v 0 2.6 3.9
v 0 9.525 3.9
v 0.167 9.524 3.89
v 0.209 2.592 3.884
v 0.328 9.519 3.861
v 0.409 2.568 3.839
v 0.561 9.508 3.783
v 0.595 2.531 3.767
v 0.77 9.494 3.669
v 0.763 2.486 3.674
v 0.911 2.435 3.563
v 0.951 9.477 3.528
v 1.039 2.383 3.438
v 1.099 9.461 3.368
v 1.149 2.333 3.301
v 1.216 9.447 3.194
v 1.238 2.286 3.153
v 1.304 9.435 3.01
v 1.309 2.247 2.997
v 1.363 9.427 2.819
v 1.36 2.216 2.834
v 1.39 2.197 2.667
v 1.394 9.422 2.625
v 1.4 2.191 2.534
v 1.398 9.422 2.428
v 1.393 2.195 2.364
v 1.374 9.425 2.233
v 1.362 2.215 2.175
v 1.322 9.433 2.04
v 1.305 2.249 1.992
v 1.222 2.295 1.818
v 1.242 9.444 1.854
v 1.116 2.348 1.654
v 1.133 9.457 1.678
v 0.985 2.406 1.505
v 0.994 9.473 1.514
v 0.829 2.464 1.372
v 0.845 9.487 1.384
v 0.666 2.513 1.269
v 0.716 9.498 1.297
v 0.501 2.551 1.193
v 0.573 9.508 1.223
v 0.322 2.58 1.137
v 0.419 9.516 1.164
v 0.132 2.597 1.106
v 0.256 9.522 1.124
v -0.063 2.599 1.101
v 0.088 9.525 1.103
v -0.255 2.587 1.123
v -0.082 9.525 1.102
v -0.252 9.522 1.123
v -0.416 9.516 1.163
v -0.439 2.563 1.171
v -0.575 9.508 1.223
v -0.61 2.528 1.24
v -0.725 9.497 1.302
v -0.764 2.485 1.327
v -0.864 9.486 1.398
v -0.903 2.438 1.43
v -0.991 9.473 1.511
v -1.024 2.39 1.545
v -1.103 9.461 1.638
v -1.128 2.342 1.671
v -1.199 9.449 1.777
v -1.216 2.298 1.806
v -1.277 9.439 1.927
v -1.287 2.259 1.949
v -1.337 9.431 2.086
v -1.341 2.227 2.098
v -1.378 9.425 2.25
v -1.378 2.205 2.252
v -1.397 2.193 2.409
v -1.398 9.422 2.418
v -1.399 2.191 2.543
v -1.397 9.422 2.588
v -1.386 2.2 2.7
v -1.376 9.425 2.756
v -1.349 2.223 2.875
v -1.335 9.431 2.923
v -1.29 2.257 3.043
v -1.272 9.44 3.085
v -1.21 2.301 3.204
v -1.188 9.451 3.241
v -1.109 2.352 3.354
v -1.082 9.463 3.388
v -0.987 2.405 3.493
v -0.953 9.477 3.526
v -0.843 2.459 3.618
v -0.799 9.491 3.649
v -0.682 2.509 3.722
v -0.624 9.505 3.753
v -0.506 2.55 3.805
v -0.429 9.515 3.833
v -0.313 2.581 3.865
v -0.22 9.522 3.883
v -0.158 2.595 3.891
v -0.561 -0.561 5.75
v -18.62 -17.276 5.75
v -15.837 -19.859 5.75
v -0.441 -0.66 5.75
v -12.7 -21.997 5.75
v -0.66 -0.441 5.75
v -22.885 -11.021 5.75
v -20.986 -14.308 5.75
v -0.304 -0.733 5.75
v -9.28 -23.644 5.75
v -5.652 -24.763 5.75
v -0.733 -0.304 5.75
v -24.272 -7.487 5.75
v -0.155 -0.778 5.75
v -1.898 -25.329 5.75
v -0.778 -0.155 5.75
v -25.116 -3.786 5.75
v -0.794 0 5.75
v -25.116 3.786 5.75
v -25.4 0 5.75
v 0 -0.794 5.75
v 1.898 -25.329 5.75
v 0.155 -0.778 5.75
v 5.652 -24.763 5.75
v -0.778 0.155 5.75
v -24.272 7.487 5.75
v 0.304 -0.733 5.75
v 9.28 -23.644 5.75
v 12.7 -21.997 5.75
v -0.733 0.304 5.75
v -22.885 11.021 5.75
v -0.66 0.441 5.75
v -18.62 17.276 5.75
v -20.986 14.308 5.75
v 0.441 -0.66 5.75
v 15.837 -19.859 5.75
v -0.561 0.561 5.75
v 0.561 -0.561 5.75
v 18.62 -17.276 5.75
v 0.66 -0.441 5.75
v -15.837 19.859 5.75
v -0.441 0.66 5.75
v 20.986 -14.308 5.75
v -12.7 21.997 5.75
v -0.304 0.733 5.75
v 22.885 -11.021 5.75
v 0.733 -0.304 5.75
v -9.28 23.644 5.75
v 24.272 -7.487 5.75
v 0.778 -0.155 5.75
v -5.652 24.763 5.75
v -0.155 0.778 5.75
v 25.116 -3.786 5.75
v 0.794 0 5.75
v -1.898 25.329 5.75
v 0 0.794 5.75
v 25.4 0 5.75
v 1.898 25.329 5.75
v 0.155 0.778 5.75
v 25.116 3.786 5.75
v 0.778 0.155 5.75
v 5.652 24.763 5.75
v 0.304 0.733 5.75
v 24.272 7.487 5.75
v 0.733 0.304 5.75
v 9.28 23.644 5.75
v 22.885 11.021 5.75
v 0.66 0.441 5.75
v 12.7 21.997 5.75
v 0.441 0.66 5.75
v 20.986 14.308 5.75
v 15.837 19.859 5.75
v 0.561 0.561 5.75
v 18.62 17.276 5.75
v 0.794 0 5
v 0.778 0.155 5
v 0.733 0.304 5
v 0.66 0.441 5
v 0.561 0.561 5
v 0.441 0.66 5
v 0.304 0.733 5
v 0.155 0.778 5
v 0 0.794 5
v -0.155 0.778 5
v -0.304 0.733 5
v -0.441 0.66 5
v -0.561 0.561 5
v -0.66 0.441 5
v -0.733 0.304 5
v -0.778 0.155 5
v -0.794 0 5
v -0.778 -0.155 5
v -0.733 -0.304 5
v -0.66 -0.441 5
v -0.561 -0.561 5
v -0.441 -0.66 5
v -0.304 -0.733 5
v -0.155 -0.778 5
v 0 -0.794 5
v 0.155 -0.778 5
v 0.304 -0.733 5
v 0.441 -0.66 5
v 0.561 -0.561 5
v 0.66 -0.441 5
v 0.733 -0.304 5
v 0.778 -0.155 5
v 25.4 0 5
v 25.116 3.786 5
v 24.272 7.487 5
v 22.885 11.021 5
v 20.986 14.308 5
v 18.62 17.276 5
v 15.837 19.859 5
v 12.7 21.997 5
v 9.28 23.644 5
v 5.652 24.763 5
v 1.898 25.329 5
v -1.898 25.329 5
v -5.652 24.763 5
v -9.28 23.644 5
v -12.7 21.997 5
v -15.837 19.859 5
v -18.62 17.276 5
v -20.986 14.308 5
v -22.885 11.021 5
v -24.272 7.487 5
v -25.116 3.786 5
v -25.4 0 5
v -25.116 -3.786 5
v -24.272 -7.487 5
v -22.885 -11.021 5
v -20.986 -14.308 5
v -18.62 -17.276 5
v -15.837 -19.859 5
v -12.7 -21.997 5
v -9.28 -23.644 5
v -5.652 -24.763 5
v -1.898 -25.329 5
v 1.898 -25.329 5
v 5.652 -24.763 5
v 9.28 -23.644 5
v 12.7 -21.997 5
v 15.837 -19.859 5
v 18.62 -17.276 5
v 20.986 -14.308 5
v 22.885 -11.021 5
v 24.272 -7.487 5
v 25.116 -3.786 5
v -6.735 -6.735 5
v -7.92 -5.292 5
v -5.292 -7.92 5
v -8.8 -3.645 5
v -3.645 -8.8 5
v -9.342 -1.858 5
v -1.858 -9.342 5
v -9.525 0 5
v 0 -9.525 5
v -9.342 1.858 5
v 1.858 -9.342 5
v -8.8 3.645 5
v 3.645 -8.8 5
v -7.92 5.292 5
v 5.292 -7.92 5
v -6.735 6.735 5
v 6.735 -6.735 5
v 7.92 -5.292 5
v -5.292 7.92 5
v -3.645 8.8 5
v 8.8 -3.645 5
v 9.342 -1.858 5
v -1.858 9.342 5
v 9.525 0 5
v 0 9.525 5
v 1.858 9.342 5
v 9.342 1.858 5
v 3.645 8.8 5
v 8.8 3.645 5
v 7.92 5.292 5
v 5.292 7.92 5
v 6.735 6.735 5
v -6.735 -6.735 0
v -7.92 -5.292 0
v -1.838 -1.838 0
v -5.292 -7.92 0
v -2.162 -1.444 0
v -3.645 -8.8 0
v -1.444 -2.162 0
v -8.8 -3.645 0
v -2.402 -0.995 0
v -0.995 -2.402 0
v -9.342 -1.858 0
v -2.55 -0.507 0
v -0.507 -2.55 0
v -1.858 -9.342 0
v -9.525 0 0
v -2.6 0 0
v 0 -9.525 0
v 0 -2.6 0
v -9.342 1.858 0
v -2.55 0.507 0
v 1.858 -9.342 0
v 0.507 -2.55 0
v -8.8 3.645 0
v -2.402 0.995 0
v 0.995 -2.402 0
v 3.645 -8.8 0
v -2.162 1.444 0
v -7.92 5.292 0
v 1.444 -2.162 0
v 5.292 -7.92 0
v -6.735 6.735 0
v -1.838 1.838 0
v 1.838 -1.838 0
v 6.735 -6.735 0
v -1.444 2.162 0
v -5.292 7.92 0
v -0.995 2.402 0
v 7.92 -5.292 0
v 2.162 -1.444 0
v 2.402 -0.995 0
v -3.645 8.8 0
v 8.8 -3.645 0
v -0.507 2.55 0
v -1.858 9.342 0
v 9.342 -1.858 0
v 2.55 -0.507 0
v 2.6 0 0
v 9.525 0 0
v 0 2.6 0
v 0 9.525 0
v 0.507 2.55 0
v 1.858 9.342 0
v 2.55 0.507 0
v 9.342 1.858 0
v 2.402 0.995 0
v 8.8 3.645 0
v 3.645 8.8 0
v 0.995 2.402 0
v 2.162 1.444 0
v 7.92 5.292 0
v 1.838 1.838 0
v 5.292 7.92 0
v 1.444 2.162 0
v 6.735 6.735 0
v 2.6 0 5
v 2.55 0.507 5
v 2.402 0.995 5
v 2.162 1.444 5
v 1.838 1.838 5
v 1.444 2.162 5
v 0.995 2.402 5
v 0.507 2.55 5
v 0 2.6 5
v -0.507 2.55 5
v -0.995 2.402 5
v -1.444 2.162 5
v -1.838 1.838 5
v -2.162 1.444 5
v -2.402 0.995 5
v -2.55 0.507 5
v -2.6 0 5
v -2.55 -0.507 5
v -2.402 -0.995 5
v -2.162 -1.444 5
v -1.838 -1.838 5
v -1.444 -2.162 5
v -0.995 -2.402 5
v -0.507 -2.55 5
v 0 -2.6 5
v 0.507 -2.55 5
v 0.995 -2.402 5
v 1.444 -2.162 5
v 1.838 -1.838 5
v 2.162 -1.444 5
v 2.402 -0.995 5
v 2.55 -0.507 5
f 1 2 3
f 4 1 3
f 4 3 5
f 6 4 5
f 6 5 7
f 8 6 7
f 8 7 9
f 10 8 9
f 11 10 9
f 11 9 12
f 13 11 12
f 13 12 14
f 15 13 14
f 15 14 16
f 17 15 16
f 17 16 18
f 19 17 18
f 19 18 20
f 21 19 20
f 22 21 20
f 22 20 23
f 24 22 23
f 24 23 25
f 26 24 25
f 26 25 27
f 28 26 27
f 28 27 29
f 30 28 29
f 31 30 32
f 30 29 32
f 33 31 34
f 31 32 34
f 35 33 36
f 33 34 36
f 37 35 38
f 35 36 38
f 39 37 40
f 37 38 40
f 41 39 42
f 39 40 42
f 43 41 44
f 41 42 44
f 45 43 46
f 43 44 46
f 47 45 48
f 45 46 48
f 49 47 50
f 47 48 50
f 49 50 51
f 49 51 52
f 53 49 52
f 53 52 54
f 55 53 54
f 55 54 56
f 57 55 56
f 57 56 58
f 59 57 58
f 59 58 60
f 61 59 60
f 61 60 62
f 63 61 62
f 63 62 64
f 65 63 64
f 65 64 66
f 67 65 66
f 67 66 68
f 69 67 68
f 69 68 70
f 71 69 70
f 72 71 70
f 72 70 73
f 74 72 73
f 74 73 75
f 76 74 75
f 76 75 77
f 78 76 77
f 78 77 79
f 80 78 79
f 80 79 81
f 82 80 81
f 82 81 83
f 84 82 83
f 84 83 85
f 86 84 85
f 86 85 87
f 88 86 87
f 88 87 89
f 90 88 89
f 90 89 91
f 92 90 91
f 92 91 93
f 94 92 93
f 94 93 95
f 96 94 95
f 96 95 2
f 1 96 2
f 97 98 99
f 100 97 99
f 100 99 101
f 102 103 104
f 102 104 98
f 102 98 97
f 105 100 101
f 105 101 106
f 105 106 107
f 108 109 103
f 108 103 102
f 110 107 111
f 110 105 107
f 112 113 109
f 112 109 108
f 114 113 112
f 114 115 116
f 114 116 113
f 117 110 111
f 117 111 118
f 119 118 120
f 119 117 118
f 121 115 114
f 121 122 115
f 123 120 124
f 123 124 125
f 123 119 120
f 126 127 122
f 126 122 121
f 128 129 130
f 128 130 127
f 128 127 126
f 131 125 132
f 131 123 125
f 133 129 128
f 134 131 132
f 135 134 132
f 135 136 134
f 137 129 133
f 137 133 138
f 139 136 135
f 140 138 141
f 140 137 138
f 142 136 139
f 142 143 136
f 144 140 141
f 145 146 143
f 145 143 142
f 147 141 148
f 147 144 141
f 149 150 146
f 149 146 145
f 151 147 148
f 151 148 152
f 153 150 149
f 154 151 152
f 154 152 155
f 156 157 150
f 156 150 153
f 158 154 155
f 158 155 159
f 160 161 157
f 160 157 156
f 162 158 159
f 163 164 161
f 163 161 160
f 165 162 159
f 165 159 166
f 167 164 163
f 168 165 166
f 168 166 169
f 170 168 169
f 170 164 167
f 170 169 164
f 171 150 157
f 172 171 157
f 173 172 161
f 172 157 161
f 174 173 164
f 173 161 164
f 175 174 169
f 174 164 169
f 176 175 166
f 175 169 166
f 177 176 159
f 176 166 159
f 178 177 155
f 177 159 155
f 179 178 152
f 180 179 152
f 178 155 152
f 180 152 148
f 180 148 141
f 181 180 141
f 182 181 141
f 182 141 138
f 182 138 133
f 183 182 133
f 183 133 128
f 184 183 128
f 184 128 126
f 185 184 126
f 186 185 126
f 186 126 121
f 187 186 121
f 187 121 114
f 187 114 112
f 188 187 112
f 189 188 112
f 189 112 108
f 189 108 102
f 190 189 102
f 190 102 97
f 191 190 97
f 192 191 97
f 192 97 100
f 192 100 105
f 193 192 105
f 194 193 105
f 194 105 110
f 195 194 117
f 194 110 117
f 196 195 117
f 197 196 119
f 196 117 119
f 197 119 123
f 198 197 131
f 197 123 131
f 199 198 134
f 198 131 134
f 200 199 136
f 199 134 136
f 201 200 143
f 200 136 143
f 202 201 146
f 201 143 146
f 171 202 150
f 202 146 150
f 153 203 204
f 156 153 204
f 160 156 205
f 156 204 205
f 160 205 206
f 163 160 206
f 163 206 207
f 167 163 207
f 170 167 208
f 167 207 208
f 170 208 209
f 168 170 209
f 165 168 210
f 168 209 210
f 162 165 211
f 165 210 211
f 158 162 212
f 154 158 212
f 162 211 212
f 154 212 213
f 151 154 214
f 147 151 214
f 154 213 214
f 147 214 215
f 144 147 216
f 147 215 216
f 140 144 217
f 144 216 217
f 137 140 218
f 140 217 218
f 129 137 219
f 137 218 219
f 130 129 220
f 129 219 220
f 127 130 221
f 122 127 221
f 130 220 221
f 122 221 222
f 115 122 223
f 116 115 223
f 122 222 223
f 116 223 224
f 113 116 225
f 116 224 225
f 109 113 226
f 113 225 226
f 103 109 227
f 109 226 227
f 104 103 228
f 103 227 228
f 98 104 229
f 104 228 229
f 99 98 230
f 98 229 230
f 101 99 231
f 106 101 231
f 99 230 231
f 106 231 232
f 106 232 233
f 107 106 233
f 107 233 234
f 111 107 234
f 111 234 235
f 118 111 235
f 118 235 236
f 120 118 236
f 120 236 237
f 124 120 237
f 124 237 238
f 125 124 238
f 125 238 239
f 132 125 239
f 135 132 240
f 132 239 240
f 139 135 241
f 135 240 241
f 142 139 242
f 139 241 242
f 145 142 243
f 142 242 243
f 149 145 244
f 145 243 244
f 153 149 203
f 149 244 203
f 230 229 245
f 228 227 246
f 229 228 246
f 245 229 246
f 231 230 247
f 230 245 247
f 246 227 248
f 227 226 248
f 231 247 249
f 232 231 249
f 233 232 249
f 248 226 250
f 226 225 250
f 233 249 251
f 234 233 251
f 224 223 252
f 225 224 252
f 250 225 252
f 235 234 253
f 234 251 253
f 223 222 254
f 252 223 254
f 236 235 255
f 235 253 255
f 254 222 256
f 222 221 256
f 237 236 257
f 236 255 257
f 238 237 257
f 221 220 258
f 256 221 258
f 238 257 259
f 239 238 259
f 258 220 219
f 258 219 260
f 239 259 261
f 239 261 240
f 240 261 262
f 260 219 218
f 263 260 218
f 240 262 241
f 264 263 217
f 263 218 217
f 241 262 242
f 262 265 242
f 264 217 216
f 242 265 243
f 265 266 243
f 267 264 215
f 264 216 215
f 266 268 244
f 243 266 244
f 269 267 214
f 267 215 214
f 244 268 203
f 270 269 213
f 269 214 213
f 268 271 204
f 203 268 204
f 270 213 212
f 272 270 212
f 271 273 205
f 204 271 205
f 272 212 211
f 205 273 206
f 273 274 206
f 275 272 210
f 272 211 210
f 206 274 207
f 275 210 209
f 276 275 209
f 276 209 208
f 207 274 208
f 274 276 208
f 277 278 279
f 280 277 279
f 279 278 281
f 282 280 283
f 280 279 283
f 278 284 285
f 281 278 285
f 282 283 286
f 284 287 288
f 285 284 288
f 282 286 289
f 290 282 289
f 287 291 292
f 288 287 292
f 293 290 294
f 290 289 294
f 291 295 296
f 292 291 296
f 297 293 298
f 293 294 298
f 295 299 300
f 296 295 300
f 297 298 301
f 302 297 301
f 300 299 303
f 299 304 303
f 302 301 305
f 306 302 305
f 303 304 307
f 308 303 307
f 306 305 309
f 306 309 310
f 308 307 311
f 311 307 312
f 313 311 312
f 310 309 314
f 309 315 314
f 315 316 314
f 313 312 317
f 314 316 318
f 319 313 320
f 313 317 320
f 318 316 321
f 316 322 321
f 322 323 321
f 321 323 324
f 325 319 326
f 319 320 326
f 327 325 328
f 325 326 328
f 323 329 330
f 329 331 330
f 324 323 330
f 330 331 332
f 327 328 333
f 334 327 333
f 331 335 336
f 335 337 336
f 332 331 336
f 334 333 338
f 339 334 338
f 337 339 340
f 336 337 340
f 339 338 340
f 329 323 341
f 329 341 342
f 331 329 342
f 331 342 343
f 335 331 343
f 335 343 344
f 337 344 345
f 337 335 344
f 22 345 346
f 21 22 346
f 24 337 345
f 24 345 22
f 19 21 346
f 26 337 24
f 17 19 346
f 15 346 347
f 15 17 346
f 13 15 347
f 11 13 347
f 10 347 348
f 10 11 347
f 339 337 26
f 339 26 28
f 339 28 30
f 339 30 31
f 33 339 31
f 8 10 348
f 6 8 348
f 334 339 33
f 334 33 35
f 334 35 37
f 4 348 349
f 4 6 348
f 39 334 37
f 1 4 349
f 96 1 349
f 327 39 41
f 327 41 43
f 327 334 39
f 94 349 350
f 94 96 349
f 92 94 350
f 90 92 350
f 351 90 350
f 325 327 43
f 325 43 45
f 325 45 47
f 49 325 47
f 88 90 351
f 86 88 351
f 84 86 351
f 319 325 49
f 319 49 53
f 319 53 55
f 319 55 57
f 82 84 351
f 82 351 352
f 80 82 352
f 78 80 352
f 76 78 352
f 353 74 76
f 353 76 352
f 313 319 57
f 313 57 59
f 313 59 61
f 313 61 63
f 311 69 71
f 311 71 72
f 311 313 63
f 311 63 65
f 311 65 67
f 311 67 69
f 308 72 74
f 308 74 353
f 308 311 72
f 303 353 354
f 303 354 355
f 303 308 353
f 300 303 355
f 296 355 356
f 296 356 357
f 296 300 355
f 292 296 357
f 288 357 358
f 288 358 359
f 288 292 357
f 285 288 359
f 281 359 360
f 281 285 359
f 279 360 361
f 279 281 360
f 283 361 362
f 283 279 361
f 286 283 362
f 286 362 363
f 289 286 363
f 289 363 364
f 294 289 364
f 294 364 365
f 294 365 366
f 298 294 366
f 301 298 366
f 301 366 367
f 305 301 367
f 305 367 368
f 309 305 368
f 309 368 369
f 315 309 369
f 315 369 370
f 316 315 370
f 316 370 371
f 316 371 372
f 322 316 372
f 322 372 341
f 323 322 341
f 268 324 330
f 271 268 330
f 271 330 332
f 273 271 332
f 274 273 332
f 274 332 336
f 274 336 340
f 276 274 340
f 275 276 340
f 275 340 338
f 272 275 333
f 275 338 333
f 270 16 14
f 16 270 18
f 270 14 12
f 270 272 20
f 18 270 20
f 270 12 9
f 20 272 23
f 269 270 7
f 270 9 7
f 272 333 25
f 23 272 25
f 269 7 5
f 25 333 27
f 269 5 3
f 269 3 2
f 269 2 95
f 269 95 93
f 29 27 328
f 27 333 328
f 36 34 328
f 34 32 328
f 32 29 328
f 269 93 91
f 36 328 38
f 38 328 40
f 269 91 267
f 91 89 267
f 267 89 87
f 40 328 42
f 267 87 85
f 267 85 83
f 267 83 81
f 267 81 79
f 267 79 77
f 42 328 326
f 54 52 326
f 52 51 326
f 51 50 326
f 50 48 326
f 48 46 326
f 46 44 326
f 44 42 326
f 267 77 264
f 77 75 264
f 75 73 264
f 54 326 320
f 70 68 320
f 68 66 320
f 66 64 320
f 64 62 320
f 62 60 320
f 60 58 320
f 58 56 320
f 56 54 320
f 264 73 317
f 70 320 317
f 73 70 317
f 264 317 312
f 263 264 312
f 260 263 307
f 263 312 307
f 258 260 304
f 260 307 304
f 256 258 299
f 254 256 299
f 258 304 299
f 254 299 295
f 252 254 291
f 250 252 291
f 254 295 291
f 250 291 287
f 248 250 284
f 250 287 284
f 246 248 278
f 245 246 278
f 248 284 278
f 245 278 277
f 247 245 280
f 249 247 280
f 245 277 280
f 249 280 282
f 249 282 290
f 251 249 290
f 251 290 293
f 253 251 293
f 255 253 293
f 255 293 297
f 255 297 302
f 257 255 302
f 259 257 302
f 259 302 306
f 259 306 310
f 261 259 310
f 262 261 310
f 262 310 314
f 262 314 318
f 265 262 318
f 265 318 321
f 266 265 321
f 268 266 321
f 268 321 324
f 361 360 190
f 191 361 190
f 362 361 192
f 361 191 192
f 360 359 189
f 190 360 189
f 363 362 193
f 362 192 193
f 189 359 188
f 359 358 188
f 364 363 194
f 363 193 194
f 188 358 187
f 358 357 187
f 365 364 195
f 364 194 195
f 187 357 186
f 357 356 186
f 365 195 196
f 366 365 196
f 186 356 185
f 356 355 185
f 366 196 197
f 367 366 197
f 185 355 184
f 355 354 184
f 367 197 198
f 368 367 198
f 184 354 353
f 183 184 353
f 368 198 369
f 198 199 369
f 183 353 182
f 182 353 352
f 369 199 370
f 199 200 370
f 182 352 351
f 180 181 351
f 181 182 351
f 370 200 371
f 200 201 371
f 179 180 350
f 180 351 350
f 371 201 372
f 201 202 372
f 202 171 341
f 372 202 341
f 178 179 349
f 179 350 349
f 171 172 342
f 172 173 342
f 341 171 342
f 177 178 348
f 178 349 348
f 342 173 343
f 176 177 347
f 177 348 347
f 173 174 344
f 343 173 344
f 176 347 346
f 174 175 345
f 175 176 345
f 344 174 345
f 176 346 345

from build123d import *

# Parameters (mm, degrees)
SKETCH1_R               = 9.525
SKETCH1_R_2             = 2.599995
BOSS_EXTRUDE1_DEPTH     = 5
SKETCH2_R               = 25.4
BOSS_EXTRUDE2_DEPTH     = 0.75
SKETCH6_R               = 0.79375
CUT_EXTRUDE2_DEPTH      = 2.54
CUT_EXTRUDE3_REACH      = 45.566
CUT_EXTRUDE3_END_RADIUS = 2.599995
SKETCH7_R               = 1.4


with BuildPart() as part:
    # Sketch1 → Boss-Extrude1 (new body)
    with BuildSketch(Plane.XY):
        Circle(SKETCH1_R)
        Circle(SKETCH1_R_2, mode=Mode.SUBTRACT)
    extrude(amount=BOSS_EXTRUDE1_DEPTH)

    # Sketch2 → Boss-Extrude2 (add)
    with BuildSketch(Plane.XY.offset(5)):
        Circle(SKETCH2_R)
    extrude(amount=BOSS_EXTRUDE2_DEPTH)

    # Sketch6 → Cut-Extrude2 (cut)
    with BuildSketch(Plane.XY.offset(5.75)):
        Circle(SKETCH6_R)
    extrude(amount=-CUT_EXTRUDE2_DEPTH, mode=Mode.SUBTRACT)

    # Cut-Extrude3: up to this cylinder (the profile starts outside it)
    cut_extrude3_end = Plane(origin=(0, 0, 2.5), z_dir=(0, 0, -1)) * Cylinder(CUT_EXTRUDE3_END_RADIUS, 97.33199, mode=Mode.PRIVATE)
    # Sketch7 → Cut-Extrude3 (cut, up to the surface)
    with BuildSketch(Plane(origin=(0, 9.525, 0), x_dir=(1, 0, 0), z_dir=(0, 1, 0)), mode=Mode.PRIVATE) as cut_extrude3_sk1:
        with Locations(Location((0, -2.5, 0), (0, 0, 270))):
            Circle(SKETCH7_R)
    cut_extrude3_tool1 = extrude(cut_extrude3_sk1.sketch, amount=-CUT_EXTRUDE3_REACH, mode=Mode.PRIVATE) - cut_extrude3_end
    add(cut_extrude3_tool1.solids().sort_by_distance((0, 9.525, 2.5))[0], mode=Mode.SUBTRACT)


solid = part.part
